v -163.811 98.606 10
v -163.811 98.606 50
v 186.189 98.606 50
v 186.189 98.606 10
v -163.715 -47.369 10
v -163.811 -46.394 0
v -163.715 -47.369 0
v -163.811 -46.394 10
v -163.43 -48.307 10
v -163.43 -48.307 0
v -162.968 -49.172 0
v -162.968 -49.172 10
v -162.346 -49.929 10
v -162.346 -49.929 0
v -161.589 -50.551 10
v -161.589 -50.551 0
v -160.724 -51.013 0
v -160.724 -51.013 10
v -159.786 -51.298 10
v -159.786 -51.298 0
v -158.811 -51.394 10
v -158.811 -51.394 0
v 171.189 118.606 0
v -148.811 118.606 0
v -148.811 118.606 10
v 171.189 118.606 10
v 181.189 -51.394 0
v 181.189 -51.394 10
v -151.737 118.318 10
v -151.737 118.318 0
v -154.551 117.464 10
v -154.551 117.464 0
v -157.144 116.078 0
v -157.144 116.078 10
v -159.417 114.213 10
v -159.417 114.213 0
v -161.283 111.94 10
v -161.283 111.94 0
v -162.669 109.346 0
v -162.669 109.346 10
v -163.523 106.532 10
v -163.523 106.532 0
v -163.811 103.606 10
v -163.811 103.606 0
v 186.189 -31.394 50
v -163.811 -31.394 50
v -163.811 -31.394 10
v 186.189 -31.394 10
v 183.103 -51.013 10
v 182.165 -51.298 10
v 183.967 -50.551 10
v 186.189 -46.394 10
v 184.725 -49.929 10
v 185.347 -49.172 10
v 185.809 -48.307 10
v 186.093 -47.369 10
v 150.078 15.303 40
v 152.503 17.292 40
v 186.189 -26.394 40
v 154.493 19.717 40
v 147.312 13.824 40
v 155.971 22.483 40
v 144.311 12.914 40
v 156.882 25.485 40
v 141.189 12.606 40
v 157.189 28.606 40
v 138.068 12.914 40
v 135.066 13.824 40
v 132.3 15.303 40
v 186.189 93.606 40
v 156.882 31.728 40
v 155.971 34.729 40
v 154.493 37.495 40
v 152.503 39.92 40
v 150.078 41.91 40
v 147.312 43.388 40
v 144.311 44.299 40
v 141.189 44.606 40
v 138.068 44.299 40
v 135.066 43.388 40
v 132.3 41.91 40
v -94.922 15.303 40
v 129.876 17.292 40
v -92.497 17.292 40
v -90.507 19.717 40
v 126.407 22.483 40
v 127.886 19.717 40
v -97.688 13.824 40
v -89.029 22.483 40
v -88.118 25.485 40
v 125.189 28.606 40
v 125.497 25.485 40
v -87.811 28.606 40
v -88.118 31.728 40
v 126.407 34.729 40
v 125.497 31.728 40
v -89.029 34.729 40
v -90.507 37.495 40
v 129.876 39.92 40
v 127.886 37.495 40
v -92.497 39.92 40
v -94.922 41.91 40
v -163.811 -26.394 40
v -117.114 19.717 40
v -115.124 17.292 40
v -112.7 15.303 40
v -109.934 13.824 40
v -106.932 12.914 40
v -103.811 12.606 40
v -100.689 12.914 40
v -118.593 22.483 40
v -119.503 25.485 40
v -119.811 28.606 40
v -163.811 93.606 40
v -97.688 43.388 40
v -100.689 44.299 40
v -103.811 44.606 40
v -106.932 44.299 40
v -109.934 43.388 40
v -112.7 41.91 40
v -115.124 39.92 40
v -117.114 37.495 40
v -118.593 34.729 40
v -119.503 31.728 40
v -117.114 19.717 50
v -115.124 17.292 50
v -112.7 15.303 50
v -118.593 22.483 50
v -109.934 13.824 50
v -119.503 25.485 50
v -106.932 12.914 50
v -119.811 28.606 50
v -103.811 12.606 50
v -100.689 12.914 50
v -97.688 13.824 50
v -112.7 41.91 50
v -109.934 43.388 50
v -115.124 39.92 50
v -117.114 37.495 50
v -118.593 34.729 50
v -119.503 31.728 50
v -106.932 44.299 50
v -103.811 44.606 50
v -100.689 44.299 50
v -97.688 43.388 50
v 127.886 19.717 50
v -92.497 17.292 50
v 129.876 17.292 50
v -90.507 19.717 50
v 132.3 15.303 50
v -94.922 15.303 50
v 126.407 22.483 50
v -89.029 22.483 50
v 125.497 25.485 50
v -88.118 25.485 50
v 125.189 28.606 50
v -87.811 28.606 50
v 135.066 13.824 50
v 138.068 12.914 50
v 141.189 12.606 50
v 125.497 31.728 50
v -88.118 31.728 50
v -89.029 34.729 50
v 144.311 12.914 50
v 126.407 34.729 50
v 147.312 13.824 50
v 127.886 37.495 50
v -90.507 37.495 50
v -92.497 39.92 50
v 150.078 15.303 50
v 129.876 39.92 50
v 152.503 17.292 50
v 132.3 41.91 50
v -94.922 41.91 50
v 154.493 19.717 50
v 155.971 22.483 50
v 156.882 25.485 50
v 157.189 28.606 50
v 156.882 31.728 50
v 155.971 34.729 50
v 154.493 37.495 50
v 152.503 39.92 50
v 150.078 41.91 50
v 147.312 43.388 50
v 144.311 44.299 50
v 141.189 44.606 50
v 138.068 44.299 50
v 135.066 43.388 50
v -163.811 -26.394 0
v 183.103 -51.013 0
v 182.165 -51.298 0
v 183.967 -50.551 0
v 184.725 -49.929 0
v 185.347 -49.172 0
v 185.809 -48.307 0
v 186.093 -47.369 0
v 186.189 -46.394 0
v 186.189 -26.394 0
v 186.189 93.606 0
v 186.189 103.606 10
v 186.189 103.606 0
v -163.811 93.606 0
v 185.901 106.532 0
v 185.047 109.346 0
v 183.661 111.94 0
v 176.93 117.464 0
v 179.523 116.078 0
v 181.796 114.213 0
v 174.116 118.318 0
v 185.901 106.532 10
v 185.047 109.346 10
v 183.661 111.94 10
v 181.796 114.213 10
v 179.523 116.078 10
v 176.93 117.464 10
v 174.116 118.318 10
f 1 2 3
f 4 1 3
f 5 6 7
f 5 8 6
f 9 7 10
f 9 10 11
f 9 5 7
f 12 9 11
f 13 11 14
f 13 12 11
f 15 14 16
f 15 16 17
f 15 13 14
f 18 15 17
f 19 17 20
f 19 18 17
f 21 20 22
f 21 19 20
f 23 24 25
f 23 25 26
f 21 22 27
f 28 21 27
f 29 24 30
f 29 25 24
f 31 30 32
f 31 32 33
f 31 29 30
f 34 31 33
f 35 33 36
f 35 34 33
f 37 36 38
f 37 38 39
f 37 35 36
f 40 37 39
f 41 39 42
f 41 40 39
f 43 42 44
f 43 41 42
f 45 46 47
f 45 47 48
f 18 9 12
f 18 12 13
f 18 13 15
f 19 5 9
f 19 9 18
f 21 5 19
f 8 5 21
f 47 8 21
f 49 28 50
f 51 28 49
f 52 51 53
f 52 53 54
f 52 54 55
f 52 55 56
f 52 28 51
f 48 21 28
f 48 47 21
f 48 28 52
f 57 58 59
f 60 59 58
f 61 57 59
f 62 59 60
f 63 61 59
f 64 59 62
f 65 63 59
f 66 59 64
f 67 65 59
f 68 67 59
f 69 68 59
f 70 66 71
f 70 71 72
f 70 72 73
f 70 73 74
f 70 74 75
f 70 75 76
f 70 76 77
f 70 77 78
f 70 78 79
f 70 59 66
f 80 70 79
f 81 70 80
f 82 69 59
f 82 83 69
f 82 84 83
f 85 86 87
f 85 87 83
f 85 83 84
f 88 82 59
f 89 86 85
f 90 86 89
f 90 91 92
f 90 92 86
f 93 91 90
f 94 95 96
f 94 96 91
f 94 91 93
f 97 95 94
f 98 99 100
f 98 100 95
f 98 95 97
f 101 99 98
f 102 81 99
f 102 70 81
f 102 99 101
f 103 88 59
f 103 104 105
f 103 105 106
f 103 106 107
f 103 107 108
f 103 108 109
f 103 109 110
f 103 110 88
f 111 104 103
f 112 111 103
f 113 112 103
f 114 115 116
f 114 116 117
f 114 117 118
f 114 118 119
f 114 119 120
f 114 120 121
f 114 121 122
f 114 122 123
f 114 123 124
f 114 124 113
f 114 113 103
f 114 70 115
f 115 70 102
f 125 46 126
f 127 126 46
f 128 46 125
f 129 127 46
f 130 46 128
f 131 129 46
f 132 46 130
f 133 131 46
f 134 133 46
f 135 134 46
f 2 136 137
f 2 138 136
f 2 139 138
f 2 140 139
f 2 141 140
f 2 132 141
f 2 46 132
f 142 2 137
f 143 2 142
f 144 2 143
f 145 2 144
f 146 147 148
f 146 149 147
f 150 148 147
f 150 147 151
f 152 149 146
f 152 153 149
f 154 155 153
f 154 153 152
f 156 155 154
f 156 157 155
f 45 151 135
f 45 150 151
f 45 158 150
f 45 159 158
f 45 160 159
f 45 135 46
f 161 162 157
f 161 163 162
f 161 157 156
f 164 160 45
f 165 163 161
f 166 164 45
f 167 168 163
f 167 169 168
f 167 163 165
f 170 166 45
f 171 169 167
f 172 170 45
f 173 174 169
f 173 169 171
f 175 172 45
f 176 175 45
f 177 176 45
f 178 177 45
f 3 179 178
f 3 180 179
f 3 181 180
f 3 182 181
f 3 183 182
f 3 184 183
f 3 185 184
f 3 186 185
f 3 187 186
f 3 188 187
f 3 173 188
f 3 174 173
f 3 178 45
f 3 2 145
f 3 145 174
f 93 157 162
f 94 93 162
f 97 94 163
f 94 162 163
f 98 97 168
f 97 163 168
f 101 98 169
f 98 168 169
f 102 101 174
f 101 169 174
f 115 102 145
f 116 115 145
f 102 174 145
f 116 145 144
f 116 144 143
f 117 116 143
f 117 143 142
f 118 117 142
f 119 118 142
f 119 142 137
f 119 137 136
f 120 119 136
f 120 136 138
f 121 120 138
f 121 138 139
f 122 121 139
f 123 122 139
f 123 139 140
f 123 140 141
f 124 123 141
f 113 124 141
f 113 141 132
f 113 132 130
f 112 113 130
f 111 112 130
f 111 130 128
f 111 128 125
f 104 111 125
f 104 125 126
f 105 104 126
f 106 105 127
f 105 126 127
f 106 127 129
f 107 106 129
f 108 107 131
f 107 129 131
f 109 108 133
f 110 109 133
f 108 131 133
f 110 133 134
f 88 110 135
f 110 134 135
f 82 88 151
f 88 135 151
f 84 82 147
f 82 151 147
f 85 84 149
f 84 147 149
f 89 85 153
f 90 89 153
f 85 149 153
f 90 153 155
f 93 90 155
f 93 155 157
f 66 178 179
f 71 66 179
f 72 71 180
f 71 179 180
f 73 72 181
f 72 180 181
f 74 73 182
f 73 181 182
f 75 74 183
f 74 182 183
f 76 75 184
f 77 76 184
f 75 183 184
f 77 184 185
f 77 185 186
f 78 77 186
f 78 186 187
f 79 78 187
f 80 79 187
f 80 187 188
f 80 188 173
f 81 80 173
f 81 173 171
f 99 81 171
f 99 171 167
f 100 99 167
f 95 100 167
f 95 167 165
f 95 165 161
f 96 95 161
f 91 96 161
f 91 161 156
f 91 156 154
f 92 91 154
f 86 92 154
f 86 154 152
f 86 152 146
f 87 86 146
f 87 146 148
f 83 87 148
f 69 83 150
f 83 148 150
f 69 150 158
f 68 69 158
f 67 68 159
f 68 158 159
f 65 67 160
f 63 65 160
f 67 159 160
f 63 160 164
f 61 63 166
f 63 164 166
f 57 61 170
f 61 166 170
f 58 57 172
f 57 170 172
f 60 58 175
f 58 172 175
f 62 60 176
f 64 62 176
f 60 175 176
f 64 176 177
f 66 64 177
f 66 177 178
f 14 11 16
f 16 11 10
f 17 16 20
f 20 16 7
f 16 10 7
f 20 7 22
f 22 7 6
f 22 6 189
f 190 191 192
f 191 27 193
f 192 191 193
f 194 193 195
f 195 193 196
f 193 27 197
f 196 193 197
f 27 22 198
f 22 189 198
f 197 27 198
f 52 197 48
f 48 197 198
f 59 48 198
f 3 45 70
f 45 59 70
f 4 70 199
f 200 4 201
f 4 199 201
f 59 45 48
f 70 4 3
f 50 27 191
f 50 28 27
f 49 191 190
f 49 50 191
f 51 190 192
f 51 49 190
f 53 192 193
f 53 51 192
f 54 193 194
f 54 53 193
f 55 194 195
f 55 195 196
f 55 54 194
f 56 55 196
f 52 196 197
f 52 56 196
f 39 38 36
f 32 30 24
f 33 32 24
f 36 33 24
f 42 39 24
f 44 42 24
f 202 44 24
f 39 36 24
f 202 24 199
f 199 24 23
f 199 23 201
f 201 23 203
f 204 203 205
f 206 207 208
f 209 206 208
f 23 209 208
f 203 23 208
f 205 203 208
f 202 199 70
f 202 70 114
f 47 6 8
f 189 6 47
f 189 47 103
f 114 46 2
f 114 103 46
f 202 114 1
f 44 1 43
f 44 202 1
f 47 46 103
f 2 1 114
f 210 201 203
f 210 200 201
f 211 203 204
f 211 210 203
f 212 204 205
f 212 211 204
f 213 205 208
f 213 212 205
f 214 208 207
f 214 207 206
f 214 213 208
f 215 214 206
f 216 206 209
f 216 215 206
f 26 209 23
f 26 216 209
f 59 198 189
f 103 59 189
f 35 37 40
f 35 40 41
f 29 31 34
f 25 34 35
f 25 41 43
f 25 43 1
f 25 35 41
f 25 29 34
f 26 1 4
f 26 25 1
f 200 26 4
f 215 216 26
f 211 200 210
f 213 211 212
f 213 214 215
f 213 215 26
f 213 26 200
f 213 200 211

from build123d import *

# Parameters (mm, degrees)
SKETCH_1_W          = 350
SKETCH_1_H          = 170
EXTRUDE_1_DEPTH     = 50
SKETCH_2_W          = 350
SKETCH_2_H          = 20
CUT_EXTRUDE_1_DEPTH = 40
SKETCH_3_W          = 350
SKETCH_3_H          = 120
CUT_EXTRUDE_2_DEPTH = 40
SKETCH_4_R          = 16
CUT_EXTRUDE_3_DEPTH = 227.34896931
FILLET_1_R          = 5
FILLET_2_R          = 5
FILLET_3_R          = 15
FILLET_4_R          = 15


with BuildPart() as part:
    # 草图1 → 凸台-拉伸1 (new body)
    with BuildSketch(Plane.XY):
        with Locations((11.189258312, 33.606138107)):
            Rectangle(SKETCH_1_W, SKETCH_1_H)
    extrude(amount=EXTRUDE_1_DEPTH)

    # 草图2 → 切除-拉伸1 (cut)
    with BuildSketch(Plane.XY.offset(50)):
        with Locations((11.189258312, -41.393861893)):
            Rectangle(SKETCH_2_W, SKETCH_2_H)
        with Locations((11.189258312, 108.606138107)):
            Rectangle(SKETCH_2_W, SKETCH_2_H)
    extrude(amount=-CUT_EXTRUDE_1_DEPTH, mode=Mode.SUBTRACT)

    # 草图3 → 切除-拉伸2 (cut)
    with BuildSketch(Plane(origin=(0, 0, 0), x_dir=(-1, 0, 0), z_dir=(0, 0, -1))):
        with Locations((-11.189258312, 33.606138107)):
            Rectangle(SKETCH_3_W, SKETCH_3_H)
    extrude(amount=-CUT_EXTRUDE_2_DEPTH, mode=Mode.SUBTRACT)

    # 草图4 → 切除-拉伸3 (cut, through all)
    with BuildSketch(Plane.XY.offset(50)):
        with Locations((-103.810741688, 28.606138107)):
            Circle(SKETCH_4_R)
        with Locations((141.189258312, 28.606138107)):
            Circle(SKETCH_4_R)
    extrude(amount=-CUT_EXTRUDE_3_DEPTH, mode=Mode.SUBTRACT)

    # 圆角1
    fillet_1_edges = [part.edges().sort_by_distance(p)[0] for p in [
        (-163.810741688, -51.393861893, 5),
    ]]
    fillet(fillet_1_edges, radius=FILLET_1_R)

    # 圆角2
    fillet_2_edges = [part.edges().sort_by_distance(p)[0] for p in [
        (186.189258312, -51.393861893, 5),
    ]]
    fillet(fillet_2_edges, radius=FILLET_2_R)

    # 圆角3
    fillet_3_edges = [part.edges().sort_by_distance(p)[0] for p in [
        (186.189258312, 118.606138107, 5),
    ]]
    fillet(fillet_3_edges, radius=FILLET_3_R)

    # 圆角4
    fillet_4_edges = [part.edges().sort_by_distance(p)[0] for p in [
        (-163.810741688, 118.606138107, 5),
    ]]
    fillet(fillet_4_edges, radius=FILLET_4_R)


solid = part.part
